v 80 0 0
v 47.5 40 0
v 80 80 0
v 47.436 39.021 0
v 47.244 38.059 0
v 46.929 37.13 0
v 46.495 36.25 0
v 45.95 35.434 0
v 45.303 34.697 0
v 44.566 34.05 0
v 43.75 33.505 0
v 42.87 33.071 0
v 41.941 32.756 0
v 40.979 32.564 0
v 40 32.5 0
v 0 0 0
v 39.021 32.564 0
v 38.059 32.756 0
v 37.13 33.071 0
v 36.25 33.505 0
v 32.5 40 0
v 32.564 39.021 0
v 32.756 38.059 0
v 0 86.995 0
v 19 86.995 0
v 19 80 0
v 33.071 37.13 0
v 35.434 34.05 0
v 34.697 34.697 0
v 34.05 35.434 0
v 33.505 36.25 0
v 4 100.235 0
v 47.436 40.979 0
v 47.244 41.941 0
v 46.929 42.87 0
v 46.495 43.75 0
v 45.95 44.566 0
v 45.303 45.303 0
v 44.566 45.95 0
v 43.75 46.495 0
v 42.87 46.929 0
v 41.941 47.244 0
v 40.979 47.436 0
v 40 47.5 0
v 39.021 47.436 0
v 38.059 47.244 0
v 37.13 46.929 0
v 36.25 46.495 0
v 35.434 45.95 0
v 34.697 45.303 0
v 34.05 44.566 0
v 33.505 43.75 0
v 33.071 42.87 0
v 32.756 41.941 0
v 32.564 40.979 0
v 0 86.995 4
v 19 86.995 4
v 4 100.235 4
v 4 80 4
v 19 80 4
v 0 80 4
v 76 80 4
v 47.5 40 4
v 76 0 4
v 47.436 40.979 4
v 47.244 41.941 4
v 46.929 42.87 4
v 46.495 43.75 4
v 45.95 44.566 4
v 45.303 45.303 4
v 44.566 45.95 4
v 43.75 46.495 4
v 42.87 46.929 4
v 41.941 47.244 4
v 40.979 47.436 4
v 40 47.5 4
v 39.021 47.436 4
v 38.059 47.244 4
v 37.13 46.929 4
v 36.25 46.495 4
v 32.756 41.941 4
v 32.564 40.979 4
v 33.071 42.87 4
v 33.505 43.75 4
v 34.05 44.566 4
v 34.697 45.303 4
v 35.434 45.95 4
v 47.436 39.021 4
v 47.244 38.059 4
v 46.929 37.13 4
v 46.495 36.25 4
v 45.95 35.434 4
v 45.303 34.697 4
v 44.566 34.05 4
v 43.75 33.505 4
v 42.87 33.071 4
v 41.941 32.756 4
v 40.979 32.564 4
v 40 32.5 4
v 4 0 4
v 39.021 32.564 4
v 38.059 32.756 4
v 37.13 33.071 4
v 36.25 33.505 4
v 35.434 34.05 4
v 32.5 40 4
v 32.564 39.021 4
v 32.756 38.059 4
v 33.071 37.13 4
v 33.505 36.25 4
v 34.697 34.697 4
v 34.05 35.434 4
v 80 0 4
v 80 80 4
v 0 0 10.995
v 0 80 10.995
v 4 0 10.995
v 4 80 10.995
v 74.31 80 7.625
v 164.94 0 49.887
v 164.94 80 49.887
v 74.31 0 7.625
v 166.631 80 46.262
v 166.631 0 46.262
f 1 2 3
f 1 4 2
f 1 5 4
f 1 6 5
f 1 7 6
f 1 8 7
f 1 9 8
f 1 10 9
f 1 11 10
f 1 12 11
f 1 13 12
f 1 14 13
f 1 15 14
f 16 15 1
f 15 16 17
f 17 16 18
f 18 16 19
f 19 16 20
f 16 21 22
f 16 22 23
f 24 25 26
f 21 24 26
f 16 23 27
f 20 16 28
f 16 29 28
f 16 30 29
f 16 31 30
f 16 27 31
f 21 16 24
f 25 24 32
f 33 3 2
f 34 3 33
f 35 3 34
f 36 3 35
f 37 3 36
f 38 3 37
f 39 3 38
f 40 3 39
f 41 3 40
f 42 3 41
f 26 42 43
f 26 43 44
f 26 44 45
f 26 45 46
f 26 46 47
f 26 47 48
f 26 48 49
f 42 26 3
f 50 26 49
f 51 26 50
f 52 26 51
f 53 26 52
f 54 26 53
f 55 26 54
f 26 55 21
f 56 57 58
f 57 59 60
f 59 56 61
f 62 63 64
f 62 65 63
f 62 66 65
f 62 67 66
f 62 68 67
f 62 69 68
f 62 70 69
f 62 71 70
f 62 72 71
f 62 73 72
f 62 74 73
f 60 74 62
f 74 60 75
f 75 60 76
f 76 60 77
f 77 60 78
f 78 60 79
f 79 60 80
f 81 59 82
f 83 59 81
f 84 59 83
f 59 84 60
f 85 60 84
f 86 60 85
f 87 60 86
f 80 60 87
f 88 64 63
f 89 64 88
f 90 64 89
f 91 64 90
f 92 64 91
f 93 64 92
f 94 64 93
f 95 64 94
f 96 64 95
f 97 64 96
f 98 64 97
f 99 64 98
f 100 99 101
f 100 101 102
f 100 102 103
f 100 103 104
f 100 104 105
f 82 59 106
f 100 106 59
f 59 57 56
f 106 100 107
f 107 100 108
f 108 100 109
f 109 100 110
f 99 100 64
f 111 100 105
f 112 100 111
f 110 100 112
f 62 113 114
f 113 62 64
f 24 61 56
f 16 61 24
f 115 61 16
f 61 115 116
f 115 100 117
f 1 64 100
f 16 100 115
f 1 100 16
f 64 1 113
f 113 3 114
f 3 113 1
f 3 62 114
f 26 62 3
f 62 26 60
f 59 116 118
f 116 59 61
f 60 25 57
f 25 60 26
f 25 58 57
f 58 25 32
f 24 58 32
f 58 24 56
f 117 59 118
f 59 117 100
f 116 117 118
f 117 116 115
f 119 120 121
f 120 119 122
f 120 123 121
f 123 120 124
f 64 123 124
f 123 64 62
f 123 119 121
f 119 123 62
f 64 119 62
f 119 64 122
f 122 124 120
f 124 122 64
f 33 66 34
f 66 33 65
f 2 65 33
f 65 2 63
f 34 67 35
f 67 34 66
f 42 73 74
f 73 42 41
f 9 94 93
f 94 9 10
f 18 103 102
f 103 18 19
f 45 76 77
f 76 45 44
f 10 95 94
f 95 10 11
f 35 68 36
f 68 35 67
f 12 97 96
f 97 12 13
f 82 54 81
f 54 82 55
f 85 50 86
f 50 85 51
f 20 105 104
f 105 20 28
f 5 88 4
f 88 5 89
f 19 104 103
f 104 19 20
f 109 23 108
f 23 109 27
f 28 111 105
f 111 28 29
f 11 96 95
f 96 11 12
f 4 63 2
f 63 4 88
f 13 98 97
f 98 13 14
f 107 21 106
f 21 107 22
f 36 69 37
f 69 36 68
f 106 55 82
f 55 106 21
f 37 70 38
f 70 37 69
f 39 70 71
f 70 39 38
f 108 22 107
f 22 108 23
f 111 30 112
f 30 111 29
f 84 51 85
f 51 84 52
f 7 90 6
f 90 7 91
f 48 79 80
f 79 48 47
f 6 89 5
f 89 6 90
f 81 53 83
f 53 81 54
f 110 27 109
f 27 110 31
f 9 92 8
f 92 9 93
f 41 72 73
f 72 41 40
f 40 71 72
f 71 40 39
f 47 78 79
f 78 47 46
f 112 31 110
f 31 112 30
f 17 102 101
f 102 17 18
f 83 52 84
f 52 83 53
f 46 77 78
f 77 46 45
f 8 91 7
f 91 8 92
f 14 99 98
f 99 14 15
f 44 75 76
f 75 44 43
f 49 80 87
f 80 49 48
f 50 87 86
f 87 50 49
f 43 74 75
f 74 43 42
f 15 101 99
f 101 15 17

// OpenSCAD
// Adjustable Phone/Tablet Stand
// Parametric stand with customizable angle and size

// === Device Parameters ===
device_width = 80;       // [50:200] Device width in mm
device_thickness = 12;   // [6:20] Device thickness (with case)

// === Stand Parameters ===
stand_angle = 65;        // [45:85] Viewing angle in degrees
stand_depth = 80;        // [50:150] Base depth in mm
stand_height = 100;      // [60:200] Back support height in mm

// === Construction ===
material_thickness = 4;  // [2:0.5:8] Material thickness
slot_depth = 15;         // [10:30] How deep device sits in slot

// === Features ===
cable_hole = true;       // Add cable pass-through hole
cable_diameter = 15;     // [8:25] Cable hole diameter
add_feet = true;         // Add anti-slip feet

// === Quality ===
$fn = 48;

module stand_profile() {
    // 2D profile of the stand side
    polygon([
        [0, 0],                                          // Front bottom
        [stand_depth, 0],                                // Back bottom
        [stand_depth, material_thickness],               // Back bottom inner
        [stand_depth - material_thickness, material_thickness], // Base top back
        [slot_depth + material_thickness, material_thickness],  // Base top front (behind slot)
        [slot_depth + material_thickness, slot_depth * tan(90 - stand_angle) + material_thickness], // Slot back
        [material_thickness, slot_depth * tan(90 - stand_angle) + material_thickness + device_thickness / sin(stand_angle)], // Slot front top
        [0, slot_depth * tan(90 - stand_angle) + material_thickness], // Front face bottom of slot
        [0, 0]                                           // Close
    ]);
}

module back_support() {
    // Back angled support
    translate([stand_depth - material_thickness, 0, material_thickness]) {
        rotate([0, -90 + stand_angle, 0]) {
            cube([stand_height, device_width, material_thickness]);
        }
    }
}

module cable_cutout() {
    if (cable_hole) {
        translate([stand_depth/2, device_width/2, -1])
            cylinder(h = material_thickness + 2, d = cable_diameter);
    }
}

module foot() {
    cylinder(h = 2, d1 = 10, d2 = 8);
}

module stand() {
    difference() {
        union() {
            // Left side
            linear_extrude(material_thickness)
                stand_profile();

            // Right side
            translate([0, device_width - material_thickness, 0])
                linear_extrude(material_thickness)
                stand_profile();

            // Base plate
            cube([stand_depth, device_width, material_thickness]);

            // Front lip
            cube([material_thickness, device_width, slot_depth * tan(90 - stand_angle) + material_thickness]);

            // Back support
            back_support();
        }

        // Cable hole
        cable_cutout();
    }

    // Feet
    if (add_feet) {
        translate([10, 10, 0]) foot();
        translate([10, device_width - 10, 0]) foot();
        translate([stand_depth - 10, 10, 0]) foot();
        translate([stand_depth - 10, device_width - 10, 0]) foot();
    }
}

stand();
